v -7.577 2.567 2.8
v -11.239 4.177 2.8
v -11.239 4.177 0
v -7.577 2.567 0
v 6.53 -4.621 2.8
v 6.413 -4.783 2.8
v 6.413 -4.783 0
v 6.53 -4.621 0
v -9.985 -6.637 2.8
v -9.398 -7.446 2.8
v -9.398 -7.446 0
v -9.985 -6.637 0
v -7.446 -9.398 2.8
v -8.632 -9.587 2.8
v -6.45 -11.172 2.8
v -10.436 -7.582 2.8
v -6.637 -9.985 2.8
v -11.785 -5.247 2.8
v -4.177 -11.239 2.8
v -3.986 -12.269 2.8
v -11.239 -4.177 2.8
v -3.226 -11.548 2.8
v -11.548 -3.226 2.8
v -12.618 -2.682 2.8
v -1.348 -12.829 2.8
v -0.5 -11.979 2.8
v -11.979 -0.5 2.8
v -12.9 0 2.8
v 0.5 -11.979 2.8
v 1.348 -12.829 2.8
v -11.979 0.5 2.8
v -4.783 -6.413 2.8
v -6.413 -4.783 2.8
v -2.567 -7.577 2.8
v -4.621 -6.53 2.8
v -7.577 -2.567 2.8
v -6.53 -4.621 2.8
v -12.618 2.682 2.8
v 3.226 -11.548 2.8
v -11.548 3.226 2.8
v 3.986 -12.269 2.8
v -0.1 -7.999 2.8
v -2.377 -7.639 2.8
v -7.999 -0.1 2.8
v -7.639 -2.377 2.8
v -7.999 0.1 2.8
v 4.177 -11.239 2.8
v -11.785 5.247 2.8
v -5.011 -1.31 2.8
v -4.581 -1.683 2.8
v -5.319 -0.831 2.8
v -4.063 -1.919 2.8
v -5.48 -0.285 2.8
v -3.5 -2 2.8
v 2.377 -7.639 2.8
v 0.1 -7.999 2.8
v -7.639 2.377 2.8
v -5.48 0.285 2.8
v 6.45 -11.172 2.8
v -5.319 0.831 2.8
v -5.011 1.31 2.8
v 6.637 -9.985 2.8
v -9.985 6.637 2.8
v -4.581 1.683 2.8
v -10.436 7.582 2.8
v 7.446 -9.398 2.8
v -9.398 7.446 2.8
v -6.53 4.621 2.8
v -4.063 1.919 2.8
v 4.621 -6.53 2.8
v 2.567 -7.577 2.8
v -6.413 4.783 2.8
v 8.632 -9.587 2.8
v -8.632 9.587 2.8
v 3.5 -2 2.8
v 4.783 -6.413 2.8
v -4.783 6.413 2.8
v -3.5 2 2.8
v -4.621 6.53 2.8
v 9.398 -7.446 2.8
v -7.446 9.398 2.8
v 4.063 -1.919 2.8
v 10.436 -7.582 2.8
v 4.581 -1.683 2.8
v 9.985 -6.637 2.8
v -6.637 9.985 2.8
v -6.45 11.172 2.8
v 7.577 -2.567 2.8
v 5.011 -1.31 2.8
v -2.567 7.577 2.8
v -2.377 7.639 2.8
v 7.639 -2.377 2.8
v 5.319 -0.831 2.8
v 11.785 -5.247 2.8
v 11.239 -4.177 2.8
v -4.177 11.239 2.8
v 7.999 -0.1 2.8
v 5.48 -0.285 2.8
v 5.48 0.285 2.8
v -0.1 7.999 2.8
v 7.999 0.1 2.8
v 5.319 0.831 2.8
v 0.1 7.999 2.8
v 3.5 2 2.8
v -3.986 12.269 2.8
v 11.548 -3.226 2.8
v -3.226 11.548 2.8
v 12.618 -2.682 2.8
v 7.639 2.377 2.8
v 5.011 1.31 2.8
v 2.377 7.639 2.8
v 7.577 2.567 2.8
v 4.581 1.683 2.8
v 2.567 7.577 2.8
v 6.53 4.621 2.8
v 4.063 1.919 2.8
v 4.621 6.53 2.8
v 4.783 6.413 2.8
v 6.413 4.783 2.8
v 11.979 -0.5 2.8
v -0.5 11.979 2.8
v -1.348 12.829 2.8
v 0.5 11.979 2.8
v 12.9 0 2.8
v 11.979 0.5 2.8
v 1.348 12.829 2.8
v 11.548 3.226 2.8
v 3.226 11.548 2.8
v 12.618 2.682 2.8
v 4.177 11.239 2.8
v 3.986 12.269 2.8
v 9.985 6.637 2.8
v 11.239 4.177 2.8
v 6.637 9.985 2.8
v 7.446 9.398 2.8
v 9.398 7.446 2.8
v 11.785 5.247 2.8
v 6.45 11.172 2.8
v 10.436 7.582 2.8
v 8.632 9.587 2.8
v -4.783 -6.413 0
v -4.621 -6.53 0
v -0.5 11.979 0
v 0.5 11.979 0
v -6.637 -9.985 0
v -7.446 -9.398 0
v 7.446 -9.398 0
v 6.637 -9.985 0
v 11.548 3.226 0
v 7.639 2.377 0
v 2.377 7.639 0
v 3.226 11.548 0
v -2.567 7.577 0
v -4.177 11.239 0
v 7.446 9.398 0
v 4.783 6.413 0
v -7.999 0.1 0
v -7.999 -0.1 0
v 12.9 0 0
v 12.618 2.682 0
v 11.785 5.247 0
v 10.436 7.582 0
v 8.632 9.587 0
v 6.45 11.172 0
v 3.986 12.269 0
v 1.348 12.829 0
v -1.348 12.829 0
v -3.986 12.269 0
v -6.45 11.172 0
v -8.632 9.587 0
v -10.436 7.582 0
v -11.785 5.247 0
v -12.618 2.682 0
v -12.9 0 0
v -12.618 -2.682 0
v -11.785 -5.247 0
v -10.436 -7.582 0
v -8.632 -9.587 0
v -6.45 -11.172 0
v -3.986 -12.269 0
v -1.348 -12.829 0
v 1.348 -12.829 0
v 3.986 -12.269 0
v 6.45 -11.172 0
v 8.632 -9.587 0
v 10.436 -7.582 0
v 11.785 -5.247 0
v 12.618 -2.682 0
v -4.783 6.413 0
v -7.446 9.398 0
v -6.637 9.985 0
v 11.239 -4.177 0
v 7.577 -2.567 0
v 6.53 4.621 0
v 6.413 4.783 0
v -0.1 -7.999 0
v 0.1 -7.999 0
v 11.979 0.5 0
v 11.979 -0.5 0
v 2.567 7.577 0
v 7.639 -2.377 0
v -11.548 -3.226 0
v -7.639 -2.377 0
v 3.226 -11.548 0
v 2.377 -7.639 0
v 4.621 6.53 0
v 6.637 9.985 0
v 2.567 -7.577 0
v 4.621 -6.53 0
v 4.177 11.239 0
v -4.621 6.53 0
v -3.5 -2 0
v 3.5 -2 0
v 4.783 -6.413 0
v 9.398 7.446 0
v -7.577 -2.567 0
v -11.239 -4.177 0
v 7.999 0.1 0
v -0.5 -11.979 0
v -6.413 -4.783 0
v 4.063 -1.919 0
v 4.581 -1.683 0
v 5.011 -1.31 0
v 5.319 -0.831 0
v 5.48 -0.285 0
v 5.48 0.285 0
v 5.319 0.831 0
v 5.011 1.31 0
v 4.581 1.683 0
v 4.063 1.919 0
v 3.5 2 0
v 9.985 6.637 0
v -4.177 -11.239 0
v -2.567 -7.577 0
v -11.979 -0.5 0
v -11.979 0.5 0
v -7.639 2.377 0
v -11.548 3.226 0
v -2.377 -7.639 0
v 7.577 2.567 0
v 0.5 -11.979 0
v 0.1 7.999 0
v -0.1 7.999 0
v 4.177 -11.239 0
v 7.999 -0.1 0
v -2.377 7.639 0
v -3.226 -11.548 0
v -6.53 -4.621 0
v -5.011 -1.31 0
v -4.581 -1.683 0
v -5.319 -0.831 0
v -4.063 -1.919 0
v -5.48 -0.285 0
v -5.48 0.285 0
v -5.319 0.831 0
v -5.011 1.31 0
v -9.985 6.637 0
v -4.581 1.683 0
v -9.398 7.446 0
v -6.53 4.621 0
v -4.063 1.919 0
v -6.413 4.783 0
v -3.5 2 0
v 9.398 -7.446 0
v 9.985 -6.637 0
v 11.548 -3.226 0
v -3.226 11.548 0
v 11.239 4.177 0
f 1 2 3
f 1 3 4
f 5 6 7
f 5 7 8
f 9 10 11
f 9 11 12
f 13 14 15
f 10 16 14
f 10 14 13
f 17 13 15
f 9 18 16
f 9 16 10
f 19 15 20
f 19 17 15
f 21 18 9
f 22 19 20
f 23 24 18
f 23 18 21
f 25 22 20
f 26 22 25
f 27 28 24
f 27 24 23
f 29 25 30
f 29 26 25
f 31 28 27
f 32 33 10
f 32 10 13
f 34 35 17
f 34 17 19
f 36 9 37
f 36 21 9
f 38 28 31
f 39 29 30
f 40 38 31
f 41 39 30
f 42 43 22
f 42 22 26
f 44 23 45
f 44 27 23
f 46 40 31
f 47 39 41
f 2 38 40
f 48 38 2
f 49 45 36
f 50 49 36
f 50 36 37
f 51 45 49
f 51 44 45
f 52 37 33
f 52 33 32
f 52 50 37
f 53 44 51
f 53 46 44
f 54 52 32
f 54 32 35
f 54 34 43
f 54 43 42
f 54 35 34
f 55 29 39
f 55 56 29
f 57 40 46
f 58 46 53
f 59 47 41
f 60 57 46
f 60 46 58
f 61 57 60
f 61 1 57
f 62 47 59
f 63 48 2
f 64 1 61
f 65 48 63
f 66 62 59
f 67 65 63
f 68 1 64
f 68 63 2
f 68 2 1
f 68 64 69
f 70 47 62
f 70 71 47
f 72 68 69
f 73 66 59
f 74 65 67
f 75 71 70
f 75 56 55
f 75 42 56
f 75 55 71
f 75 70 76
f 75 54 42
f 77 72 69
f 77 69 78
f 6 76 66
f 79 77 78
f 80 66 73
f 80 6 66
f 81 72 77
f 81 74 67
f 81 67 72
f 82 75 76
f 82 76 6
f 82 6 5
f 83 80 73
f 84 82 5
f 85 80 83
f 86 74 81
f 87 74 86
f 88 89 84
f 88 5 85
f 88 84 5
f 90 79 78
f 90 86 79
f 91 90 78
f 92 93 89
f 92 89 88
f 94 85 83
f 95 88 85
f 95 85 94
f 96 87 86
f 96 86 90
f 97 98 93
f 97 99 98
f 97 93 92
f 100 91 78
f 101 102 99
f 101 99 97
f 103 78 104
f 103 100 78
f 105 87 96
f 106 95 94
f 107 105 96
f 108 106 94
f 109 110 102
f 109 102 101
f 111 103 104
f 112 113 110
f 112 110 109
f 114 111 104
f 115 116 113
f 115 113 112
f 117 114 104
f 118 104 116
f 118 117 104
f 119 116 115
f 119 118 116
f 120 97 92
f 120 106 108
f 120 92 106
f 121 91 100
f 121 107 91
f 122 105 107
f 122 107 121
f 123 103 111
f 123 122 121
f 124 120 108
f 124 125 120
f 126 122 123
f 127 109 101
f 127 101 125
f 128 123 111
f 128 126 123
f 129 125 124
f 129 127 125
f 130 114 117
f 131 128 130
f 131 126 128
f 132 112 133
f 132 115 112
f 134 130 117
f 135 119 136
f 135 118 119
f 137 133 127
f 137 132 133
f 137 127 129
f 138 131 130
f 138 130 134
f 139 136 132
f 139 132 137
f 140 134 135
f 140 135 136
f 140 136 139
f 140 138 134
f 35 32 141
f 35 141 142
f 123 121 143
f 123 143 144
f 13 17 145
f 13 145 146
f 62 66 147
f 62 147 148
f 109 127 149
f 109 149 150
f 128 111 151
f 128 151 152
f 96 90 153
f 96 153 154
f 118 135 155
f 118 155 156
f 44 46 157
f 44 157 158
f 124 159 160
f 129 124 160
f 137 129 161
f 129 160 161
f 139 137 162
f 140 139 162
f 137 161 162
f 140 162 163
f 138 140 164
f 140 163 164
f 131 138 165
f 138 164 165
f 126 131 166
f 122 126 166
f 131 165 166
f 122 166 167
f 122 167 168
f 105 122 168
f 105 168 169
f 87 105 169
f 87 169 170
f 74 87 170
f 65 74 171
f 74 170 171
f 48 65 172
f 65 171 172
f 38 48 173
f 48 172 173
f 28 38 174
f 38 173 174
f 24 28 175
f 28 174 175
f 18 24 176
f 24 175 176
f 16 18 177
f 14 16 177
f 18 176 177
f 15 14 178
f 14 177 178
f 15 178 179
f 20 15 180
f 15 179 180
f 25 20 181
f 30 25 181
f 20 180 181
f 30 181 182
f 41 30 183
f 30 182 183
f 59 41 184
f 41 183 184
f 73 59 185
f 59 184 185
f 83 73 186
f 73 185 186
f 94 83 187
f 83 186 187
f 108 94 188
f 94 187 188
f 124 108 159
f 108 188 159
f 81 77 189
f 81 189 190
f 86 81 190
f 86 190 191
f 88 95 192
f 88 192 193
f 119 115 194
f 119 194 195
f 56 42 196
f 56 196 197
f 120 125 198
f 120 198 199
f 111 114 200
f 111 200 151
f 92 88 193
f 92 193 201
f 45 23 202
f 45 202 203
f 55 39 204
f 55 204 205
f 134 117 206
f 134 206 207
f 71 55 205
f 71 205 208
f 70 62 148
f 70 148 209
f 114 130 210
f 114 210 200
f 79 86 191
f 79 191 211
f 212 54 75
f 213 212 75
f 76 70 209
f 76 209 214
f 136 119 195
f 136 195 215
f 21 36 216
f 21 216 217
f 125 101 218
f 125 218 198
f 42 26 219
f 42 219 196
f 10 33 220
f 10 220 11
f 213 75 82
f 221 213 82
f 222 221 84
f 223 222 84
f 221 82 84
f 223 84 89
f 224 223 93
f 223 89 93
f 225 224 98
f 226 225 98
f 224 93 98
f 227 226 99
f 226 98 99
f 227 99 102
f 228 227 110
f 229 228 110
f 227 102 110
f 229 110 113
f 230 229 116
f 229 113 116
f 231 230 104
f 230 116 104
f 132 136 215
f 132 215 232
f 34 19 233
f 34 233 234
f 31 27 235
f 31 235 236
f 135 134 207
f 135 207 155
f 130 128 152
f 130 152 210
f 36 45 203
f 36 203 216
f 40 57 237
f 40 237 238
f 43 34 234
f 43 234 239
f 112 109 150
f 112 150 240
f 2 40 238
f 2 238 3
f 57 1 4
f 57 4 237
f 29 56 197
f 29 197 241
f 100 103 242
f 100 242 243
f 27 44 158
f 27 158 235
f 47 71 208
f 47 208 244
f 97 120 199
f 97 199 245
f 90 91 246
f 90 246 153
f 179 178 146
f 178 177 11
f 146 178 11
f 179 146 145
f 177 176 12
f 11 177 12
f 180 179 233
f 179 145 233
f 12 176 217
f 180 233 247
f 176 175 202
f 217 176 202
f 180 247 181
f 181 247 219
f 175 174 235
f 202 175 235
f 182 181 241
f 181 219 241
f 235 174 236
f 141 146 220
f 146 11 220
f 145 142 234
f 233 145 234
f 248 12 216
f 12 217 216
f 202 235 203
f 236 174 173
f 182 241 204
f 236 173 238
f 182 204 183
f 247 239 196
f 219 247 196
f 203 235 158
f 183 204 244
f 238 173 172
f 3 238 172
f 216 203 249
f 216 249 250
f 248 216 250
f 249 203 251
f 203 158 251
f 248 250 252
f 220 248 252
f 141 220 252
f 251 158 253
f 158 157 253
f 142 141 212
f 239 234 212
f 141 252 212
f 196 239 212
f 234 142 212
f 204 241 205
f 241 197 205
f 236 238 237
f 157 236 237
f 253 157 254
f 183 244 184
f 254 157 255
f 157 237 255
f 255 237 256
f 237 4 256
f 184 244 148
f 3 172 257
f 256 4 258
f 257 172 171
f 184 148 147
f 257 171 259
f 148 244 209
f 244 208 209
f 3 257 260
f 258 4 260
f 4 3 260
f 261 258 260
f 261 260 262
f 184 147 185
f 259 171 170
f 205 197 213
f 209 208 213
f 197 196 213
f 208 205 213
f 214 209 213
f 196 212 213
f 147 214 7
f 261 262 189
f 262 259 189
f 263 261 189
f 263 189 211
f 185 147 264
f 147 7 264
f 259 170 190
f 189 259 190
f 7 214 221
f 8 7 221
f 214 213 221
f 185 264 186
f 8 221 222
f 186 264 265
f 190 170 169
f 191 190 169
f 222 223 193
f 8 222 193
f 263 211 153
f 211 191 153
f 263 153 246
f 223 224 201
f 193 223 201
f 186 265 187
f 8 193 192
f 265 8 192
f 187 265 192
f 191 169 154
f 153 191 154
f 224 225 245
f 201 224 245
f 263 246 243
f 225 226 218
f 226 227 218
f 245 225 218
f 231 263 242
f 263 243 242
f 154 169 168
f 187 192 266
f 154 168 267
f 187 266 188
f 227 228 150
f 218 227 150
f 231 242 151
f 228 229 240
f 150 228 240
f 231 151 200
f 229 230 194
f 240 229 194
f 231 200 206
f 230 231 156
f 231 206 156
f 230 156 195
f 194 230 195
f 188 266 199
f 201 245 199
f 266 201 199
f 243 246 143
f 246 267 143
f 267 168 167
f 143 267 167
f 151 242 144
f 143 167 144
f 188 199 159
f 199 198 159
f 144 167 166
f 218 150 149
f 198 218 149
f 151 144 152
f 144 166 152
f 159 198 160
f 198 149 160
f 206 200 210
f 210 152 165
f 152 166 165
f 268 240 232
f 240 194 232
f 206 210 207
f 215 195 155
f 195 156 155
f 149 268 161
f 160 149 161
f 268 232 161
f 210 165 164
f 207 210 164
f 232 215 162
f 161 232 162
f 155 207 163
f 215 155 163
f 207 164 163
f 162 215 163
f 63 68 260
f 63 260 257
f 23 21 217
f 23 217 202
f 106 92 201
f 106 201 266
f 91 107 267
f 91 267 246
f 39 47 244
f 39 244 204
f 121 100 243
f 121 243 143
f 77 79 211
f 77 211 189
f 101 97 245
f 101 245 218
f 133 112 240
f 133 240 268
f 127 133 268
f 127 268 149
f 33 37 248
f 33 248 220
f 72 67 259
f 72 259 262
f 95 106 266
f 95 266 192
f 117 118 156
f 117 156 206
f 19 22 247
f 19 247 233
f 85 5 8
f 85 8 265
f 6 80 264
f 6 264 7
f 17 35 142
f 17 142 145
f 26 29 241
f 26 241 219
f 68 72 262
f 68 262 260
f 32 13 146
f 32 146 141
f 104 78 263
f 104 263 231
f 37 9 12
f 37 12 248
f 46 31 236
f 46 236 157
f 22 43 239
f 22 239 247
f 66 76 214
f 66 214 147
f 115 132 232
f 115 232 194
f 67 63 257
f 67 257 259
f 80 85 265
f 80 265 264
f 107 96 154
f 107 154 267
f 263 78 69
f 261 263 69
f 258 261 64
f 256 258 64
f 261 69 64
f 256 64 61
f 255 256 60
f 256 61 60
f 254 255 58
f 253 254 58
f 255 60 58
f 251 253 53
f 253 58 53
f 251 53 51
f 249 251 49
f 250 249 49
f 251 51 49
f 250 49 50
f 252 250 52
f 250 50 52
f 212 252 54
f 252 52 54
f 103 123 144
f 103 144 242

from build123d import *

# Parameters (mm, degrees)
SKETCH_R           = 12.9
PAD_DEPTH          = 2.8
POCKET_DEPTH       = 2.801
POCKET001_DEPTH    = 75.988977
POLARPATTERN_COUNT = 20


with BuildPart() as part:
    # Sketch → Pad (new body)
    with BuildSketch(Plane.XY):
        Circle(SKETCH_R)
    extrude(amount=PAD_DEPTH)

    # Sketch001 → Pocket (cut, through all)
    with BuildSketch(Plane.XY.offset(2.8)):
        with BuildLine():
            ThreePointArc((-3.5, 2), (-5.5, 0), (-3.5, -2))
            Line((-3.5, -2), (3.5, -2))
            ThreePointArc((3.5, -2), (5.5, 0), (3.5, 2))
            Line((-3.5, 2), (3.5, 2))
        make_face()
    extrude(amount=-POCKET_DEPTH, mode=Mode.SUBTRACT)

    # Sketch002 → Pocket001 (cut, through all)
    with BuildSketch(Plane.XY.offset(2.8)):
        Polygon((-0.5, 11.979325), (0.5, 11.979325), (0.1, 7.999375), (-0.1, 7.999375), align=None)
    pocket001 = extrude(amount=-POCKET001_DEPTH, mode=Mode.SUBTRACT)

    # PolarPattern: Pocket001 ×20 about axis
    polarpattern_axis = Axis((0, 0, 2.8), (0, 0, 1))
    for i in range(1, POLARPATTERN_COUNT):
        add(pocket001.rotate(polarpattern_axis, i * 360 / POLARPATTERN_COUNT), mode=Mode.SUBTRACT)


solid = part.part
